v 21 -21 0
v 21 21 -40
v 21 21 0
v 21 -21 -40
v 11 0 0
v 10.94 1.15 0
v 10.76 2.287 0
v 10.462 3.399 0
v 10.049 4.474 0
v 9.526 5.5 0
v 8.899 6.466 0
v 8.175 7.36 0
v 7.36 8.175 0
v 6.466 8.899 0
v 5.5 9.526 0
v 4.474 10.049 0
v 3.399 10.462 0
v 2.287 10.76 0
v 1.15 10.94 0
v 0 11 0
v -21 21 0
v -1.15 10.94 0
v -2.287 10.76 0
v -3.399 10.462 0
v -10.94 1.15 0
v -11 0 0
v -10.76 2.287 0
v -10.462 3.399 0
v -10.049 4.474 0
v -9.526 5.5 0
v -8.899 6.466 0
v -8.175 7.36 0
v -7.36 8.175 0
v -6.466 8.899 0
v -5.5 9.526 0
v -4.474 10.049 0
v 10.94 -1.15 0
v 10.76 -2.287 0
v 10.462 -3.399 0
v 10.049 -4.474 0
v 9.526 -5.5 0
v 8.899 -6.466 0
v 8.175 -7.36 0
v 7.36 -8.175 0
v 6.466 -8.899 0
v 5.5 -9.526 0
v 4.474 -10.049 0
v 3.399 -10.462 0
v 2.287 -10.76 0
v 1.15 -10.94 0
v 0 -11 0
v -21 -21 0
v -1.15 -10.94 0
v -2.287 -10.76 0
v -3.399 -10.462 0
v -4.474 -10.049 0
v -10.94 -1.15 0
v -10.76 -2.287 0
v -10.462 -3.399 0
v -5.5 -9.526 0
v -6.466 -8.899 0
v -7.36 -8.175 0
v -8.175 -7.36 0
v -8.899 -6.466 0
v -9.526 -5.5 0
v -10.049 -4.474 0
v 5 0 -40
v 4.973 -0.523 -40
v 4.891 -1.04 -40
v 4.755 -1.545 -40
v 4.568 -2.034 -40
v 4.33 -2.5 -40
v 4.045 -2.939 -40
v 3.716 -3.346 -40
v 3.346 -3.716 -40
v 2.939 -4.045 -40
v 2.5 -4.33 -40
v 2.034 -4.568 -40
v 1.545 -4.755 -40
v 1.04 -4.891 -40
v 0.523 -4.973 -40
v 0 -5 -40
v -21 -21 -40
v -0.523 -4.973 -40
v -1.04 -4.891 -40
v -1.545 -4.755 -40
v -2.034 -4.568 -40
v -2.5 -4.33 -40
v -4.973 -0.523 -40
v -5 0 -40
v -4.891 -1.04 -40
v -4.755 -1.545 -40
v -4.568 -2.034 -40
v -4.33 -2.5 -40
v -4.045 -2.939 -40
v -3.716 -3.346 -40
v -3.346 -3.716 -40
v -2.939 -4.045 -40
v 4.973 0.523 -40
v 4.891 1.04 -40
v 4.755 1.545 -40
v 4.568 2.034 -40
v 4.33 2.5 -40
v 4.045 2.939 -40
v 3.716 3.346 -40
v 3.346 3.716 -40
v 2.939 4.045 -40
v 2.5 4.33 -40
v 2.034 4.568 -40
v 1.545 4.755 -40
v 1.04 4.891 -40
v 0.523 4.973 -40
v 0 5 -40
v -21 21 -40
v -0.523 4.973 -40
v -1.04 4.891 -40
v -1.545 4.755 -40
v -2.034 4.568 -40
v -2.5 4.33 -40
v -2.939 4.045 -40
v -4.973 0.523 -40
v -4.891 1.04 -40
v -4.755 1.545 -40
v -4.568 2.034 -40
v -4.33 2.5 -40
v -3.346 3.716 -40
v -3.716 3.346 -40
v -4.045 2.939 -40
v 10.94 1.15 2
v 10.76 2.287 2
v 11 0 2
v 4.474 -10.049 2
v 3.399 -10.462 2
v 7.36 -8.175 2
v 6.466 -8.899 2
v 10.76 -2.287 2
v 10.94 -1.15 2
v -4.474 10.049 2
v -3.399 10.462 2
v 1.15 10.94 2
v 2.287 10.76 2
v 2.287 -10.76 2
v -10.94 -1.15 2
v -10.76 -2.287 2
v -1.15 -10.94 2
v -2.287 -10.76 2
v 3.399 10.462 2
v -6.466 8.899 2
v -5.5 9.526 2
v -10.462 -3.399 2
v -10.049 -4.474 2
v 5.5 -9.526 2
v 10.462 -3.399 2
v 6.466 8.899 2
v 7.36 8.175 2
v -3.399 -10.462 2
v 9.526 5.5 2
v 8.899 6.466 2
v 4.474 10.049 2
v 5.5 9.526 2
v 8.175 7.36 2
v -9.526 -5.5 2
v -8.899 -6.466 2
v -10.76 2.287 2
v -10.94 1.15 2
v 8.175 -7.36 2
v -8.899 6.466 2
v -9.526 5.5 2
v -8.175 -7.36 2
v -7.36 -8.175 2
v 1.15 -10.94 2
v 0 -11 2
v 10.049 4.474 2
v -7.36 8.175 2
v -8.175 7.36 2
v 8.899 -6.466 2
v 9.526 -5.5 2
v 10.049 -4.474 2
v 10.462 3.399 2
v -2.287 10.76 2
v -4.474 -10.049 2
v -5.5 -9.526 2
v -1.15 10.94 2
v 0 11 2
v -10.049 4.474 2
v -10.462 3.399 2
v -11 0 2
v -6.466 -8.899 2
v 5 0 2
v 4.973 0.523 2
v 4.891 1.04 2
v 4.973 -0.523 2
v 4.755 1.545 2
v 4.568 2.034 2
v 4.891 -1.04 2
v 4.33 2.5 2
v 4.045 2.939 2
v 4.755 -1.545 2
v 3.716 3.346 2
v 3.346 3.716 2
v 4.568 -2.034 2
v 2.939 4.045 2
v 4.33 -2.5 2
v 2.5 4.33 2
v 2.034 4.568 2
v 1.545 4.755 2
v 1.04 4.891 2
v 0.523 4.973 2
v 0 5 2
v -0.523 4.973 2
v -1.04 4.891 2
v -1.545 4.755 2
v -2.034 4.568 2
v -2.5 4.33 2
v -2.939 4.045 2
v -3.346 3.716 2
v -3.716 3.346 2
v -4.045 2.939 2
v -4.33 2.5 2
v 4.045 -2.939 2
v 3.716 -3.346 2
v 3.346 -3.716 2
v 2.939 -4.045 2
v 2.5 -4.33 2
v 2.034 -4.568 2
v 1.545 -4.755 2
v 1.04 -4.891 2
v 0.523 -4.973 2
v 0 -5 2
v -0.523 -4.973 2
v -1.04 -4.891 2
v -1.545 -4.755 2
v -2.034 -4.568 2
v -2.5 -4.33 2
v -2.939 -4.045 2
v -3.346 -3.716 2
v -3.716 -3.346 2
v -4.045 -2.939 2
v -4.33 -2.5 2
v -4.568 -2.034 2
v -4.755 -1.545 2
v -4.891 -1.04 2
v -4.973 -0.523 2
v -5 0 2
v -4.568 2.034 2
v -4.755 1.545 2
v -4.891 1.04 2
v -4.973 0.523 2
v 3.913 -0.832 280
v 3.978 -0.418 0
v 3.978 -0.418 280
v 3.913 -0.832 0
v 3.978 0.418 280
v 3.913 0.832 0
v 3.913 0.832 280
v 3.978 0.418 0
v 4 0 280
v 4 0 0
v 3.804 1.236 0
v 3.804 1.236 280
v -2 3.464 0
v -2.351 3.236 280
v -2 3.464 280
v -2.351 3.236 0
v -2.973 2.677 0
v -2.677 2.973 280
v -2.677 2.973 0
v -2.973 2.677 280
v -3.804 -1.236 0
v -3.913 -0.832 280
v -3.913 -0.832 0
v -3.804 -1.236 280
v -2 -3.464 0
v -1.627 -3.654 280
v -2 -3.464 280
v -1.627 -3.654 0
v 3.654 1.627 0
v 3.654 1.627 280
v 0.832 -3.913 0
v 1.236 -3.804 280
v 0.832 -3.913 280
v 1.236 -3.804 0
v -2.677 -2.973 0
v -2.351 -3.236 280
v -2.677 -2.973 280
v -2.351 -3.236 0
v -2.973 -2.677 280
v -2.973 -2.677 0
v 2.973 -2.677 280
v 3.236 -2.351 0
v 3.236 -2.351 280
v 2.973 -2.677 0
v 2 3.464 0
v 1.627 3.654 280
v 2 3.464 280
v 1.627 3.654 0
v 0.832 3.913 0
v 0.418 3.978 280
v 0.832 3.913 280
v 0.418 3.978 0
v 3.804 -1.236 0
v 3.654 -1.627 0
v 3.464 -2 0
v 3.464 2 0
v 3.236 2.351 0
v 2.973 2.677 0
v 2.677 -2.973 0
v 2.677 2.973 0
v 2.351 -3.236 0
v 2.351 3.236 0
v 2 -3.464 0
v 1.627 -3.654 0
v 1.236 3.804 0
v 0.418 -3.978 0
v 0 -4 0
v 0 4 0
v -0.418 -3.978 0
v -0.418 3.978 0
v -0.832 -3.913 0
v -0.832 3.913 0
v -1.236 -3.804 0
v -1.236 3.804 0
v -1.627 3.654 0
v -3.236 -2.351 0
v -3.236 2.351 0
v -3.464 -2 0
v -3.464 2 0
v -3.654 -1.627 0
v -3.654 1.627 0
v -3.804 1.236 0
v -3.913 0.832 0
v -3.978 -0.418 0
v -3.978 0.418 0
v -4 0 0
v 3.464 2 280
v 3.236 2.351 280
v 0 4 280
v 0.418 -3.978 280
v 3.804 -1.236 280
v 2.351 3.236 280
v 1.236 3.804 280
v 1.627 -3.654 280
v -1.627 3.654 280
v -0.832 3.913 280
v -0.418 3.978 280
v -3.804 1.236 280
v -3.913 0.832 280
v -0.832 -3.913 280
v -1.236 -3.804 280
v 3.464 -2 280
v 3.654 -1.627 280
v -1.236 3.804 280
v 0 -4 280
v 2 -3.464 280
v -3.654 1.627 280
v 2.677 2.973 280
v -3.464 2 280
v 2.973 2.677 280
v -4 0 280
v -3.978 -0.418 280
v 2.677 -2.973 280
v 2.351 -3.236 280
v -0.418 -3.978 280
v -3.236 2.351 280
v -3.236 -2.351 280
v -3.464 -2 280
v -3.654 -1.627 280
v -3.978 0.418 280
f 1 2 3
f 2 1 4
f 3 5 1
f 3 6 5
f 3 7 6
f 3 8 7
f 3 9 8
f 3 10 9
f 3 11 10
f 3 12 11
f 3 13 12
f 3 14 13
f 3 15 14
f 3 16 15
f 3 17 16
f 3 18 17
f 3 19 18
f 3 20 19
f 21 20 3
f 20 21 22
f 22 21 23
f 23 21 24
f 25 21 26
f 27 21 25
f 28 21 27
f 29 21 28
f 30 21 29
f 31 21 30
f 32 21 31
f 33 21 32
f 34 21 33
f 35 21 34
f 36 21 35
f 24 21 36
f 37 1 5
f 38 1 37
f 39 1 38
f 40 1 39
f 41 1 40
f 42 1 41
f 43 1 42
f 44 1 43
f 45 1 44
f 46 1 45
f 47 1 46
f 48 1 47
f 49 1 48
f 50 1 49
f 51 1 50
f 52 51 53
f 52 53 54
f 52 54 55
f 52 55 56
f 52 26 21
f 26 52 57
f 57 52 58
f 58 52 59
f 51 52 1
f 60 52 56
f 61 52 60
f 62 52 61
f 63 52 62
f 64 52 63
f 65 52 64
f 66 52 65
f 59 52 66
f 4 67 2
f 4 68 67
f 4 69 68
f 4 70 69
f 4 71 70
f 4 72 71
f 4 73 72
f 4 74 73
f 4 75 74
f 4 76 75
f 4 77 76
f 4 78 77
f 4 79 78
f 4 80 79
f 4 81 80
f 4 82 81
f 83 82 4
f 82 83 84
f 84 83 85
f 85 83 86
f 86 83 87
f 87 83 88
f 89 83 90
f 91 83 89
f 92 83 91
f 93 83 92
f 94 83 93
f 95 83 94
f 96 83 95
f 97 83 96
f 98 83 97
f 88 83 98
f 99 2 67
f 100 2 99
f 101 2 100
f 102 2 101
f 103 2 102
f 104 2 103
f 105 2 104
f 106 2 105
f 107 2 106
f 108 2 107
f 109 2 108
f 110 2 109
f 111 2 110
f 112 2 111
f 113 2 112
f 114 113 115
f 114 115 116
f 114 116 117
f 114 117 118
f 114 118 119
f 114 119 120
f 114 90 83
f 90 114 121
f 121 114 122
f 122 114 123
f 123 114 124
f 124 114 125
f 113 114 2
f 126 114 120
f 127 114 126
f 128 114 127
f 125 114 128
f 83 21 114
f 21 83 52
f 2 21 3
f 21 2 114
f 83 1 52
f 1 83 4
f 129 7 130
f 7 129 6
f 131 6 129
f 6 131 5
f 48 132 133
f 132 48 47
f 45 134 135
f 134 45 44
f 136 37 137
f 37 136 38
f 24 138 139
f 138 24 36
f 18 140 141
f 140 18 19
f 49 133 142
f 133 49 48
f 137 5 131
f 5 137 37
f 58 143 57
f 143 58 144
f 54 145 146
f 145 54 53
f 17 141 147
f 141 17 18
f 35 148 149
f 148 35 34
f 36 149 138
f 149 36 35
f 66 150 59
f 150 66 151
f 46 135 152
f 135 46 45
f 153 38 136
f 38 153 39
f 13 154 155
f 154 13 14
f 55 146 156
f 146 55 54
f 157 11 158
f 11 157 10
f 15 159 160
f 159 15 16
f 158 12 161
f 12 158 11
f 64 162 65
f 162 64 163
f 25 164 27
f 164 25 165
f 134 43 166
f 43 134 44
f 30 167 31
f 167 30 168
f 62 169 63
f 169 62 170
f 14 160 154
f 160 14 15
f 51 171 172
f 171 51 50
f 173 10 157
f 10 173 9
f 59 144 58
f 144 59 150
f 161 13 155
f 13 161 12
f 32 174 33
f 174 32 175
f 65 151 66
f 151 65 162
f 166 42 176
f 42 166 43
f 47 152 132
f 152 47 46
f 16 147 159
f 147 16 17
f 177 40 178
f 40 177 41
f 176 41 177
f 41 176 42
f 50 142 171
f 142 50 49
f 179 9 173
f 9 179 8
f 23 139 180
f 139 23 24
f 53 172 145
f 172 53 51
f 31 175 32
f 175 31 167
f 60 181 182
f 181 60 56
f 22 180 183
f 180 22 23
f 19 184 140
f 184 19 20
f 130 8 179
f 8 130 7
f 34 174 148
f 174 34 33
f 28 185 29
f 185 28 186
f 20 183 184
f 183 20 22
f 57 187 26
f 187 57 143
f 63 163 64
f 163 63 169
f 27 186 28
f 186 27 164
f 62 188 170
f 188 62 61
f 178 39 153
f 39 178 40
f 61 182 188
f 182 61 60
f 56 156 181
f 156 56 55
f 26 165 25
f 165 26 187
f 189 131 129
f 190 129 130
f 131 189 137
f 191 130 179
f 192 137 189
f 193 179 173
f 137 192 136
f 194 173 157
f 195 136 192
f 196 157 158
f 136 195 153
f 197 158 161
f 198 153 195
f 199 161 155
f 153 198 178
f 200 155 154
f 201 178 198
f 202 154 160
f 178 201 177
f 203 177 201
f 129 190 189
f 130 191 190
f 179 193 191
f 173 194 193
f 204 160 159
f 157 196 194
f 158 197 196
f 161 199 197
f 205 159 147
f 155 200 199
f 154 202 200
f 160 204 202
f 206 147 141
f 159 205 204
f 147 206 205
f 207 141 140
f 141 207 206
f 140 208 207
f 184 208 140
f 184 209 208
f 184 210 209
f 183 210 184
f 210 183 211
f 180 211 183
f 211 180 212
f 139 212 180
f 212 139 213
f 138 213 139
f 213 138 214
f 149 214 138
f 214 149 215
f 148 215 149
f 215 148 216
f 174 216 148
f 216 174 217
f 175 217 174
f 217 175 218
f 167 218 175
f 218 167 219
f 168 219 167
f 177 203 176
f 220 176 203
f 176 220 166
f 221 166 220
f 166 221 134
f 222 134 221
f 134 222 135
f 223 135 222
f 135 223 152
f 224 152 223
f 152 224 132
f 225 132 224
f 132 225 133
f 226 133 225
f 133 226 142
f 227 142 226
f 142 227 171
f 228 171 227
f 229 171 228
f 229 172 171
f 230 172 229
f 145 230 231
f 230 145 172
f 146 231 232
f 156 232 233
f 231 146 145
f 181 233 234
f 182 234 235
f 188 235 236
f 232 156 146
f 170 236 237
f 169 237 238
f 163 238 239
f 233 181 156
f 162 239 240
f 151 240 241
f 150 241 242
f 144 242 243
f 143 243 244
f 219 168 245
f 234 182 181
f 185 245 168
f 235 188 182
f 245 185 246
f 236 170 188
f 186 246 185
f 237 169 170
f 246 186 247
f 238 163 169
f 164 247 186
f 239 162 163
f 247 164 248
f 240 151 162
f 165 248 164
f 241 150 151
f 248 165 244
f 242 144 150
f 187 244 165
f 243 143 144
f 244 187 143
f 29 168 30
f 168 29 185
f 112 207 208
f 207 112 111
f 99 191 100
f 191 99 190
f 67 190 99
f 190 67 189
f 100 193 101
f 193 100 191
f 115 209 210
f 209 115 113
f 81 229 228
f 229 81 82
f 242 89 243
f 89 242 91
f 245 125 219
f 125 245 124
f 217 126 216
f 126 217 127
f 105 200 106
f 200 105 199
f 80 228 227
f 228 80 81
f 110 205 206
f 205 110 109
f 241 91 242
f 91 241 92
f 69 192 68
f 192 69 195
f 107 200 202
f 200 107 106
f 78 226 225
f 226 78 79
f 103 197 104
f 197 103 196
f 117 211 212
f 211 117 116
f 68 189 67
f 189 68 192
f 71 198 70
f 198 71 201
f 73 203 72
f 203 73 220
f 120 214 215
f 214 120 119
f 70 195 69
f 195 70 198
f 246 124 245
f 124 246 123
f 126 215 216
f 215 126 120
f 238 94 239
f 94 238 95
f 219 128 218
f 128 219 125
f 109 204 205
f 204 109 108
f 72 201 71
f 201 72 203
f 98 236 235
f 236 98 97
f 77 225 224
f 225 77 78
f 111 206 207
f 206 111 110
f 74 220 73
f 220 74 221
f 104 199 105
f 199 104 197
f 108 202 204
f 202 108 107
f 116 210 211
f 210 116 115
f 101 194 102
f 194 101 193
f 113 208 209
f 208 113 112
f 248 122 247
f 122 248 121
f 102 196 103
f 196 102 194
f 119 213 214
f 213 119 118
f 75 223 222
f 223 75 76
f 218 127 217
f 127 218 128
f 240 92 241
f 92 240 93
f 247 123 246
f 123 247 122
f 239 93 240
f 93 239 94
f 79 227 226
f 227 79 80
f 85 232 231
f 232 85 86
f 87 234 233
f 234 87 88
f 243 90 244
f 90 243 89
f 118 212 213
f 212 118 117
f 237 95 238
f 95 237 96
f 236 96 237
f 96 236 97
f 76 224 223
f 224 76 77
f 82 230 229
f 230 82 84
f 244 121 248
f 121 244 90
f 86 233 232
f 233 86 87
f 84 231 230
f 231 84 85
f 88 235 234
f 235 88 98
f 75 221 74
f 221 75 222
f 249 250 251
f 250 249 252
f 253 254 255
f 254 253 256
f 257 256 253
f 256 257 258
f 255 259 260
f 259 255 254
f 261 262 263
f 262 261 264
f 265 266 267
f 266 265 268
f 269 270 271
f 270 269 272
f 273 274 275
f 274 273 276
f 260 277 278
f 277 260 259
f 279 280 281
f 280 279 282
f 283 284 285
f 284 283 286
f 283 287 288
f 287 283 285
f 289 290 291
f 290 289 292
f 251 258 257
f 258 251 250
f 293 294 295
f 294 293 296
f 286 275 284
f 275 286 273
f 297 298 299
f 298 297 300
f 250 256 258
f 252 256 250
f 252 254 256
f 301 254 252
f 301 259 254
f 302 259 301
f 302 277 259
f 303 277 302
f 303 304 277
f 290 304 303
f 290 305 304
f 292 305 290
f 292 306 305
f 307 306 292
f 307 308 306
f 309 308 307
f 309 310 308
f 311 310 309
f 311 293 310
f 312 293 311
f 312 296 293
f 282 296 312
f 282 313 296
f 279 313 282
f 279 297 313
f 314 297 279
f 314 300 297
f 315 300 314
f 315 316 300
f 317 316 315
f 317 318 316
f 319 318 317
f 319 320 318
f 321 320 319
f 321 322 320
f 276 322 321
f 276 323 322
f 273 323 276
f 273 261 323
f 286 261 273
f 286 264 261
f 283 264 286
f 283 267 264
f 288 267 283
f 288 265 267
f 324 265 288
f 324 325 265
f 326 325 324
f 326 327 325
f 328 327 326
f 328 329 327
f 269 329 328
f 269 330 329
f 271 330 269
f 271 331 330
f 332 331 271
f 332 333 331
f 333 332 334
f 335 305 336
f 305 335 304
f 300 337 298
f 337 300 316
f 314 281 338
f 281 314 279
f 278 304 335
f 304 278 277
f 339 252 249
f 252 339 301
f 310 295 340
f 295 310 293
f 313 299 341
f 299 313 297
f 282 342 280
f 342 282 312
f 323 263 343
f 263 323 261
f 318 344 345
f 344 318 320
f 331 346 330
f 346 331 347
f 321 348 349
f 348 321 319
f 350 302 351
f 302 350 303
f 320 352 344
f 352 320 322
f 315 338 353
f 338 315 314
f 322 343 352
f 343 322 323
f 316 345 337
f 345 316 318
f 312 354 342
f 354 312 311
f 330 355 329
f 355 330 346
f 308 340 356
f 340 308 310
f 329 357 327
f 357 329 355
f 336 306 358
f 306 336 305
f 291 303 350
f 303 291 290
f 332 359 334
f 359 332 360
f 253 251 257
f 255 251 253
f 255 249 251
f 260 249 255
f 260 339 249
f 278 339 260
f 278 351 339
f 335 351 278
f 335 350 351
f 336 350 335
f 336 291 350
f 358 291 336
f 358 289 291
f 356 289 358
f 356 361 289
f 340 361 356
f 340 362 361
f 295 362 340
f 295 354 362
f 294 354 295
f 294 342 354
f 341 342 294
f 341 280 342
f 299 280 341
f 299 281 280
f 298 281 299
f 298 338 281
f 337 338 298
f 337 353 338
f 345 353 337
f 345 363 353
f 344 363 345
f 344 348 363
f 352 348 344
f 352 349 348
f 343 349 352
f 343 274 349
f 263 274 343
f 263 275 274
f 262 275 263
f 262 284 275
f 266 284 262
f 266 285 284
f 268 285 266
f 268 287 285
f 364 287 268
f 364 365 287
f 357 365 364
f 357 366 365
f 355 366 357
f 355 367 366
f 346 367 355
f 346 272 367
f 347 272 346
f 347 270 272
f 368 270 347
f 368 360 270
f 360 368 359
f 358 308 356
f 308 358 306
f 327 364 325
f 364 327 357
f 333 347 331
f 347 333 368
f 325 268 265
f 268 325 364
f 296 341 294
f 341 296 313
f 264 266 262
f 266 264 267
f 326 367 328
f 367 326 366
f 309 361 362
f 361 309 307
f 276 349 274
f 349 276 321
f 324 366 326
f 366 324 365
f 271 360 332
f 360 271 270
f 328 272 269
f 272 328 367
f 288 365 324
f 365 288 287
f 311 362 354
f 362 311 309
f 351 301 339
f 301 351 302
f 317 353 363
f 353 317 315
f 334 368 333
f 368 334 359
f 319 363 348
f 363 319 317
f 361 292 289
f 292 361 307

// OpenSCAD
// file: _params.scad
// =========================================================================
// 공유 파라미터 (모든 개별 부품 파일에서 include)
// 메인 어셈블리: cup_z_x_catrage_frame_water_mic_anti_3030.scad 에서 추출
// 프레임: 600 × 420 × 700mm (3030 프로파일, Y=0 대칭)
// =========================================================================

$fn = 60;  // 부품 출력용 고해상도
GLOBAL_TOLERANCE = 0.2;

// --- [1] 하부 기성품 및 원통 파라미터 ---
X_RAIL_LEN = 290.0;
X_BLOCK_W = 30.0; X_BLOCK_L = 32.0;   // 신규 X슬라이더 블록 (폭 30mm × 길이 32mm)
X_PITCH_X = 20.0; X_PITCH_Y = 20.0;   // 체결 홀 피치 (20 × 20mm, M3 나사탭 4개)
X_RAIL_W = 30.0;  X_RAIL_H = 20.0;   // 레일 폭 30mm (레일 바닥~블록 윗면 높이 29mm 반영)
X_TOTAL_H = 29.0;                    // 레일 바닥에서 슬라이더 블록 윗면까지의 높이

MOTOR_W = 42.0;      MOTOR_PITCH = 31.0; MOTOR_HOLE_D = 3.5;    
MOTOR_BOSS_D = 22.0; MOTOR_BOSS_H = 2.0; SCREW_D = 8.0;         
MOT_BODY_L = 41.0;   SHAFT_L = 24.0;     // 실측 NEMA17 몸통 41mm / 축 돌출 24mm

CUP_ID = 99.5;  CUP_WALL = 5.0; CUP_OD = 110.0;     // 아크릴 원통 OD110/ID100
CUP_H = 180.0;   CAGE_H = 60.0;  FLOOR_H = 10.0; PISTON_H = 20.0;     

LIP_D = 30.0;    LIP_H = 5.0;    LEAK_DRAIN_D = 4.0;    
GUIDE_PIPE_D = 8.0; BUSHING_OD = 12.0; BUSHING_H = 8.0;       
DRAIN_RADIUS = 35.0; DRAIN_D = 8.0;        

Y_OFFSET = 85.0; BRKT_H = 12.0; BRKT_D = 122.0; BRKT_ID = 62.0; Z_MOUNT_PCD = 86.0;   

// --- [2] 아크릴 파이프 및 상부 카트리지 ---
ACRYL_ID = 100.0; ACRYL_T = 5.0; ACRYL_OD = ACRYL_ID + (ACRYL_T * 2);  // OD110 (아크릴집 106 재고없음 → 컵과 동일 규격)

REVOLVER_PCD = 240.0;     // 인접 카트리지 웹 9.8mm 확보 (OD110 대응, 230→240)
CARTRIDGE_OD = REVOLVER_PCD + ACRYL_OD + 8; 
TOP_PLATE_H = 15.0;       // 아크릴 15T 통판 (보스홀 단 깊이 10mm)

HUB_D = 60.0;            
SHAFT_D = 12.0;          
HUB_WALL = 4.0;          
HUB_H = 15.0;             // 아크릴 5T × 3장 적층 — 파이프 130mm 대응
POCKET_DEPTH = 5.0;
MID_HUB_Z = 63.5;          // 중단 허브 하면 Z (벨트 중심 Z=71.0mm 정렬, 풀리 상단 Z=75.0mm = 축상단-1mm)
UPPER_HUB_Z = 135.0;       // 상단 허브 하면 Z (전체 135+15=150 유지)
BOSS_OD = 35.0;
BOSS_H = 11.0;             // 보스11 + 와셔1 = 12, 리세스10 → 허브 2mm 공중

// --- [3] GT2 벨트 구동 시스템 ---
GT2_PITCH     = 2.0;
GT2_BELT_W    = 6.0;
BIG_PULLEY_TEETH = 566;
BIG_PULLEY_PD = BIG_PULLEY_TEETH * GT2_PITCH / PI;
BIG_PULLEY_OD = BIG_PULLEY_PD + 1.0;
SMALL_PULLEY_TEETH = 20;
SMALL_PULLEY_PD = SMALL_PULLEY_TEETH * GT2_PITCH / PI;
SMALL_PULLEY_OD = SMALL_PULLEY_PD + 1.0;

BELT_MOTOR_X = -300;
BELT_MOTOR_Y = -155.5;
BRKT_MOTOR_H = 25.0;
BRKT_MOTOR_W = 45.0;        // 브래킷 폭 45mm (프로파일 간섭 회피 복원)
SLOT_LEN = 10.0;
FLAG_W = 15.0;  FLAG_H = 8.0;  FLAG_T = 1.5;

X_POS_MEASURE = 170.0;   // 측정 브래킷 X좌표 (X_M~X_R 정중앙, X대칭)

// --- [4] 3030 프레임 경계 (600×430×700mm) ---
PF = 30;             // 3030 알루미늄 프로파일
WASHER_T = 1.0;     

X_L = -320;
X_M = 60;
X_R = 250;
Y_F = -210;          // 전방 (대칭: -210+30=-180, Y=0 중심)
Y_B = 180;           // 후방 (대칭: 180+30=210, Y=0 중심) — 메인파일과 동기화

Z_BOT = -480;
Z_RAIL = -322;
Z_MID = -TOP_PLATE_H - PF;
Z_TOP = 220;

SUPPORT_PILLAR_H = Z_TOP - PF;

SHAFT_SQ = 20;       // 2020 사각 회전축

// 사각 축 홀 크기
SQ = SHAFT_SQ + GLOBAL_TOLERANCE;  // 20.2mm

// --- 리볼버/컵 축 정렬 (보스홀=판 중심에 리볼버 정렬) ---
REVOLVER_CX = (X_L + X_M + PF)/2;        // 판 중심 = 보스홀 = 리볼버 회전축 (-115)
DROP_X      = REVOLVER_CX + REVOLVER_PCD/2;  // 링 드롭 / 컵 적재 축 (+5)

FLANGE_Z = 52.0;       // 모터 전면 안착 높이 (Z=52mm -> 축 상단 Z=76mm, 풀리 결합)

// --- [5] 모터 체결홀 (이미 제작 완료된 15T 상판 원본 도면 수치 100% 유지) ---
MOTOR_BOLT_PITCH     = 25.0;      // Y피치 (Y = ±12.5mm)
MOTOR_BOLT_X_NOMINAL = X_L + 55;  // 1열: 상판 좌단 55 (모터축 기준 +35mm = X=-265mm)
MOTOR_BOLT_X_SHIFT   = X_L + 40;  // 2열: 상판 좌단 40 (모터축 기준 +20mm = X=-280mm)

// 모터 마운트 볼트 카운터보어 (단볼트용 — 브래킷 두께 25 중 깊게 파냄)
MOTOR_CB_D     = 6.5;            // M3 캡볼트 머리 클리어런스
MOTOR_CB_DEPTH = 19;             // 카운터보어 깊이 (잔여 통과 6mm → M3×10 단볼트)
// main file
// =========================================================================
// [구매] Z축 모터 + 리드스크류 세트 × 1
// 구매: NEMA17 스테핑모터 + T8 리드스크류(~290mm) + 리드넛
// 메인 파일 z_motor_dummy() + z_moving_parts_assembly() 스크류 부분 복사
// =========================================================================
include <_params.scad>

// NEMA17 모터 본체
color([0.1, 0.1, 0.1]) difference() {
    union() {
        translate([-MOTOR_W/2, -MOTOR_W/2, -40]) cube([MOTOR_W, MOTOR_W, 40]);
        cylinder(d=MOTOR_BOSS_D, h=MOTOR_BOSS_H);
    }
    translate([0, 0, -45]) cylinder(d = SCREW_D + 2, h = 50);
}

// 리드스크류 (ø8 × 280mm)
color([0.9, 0.9, 0.2]) cylinder(d=8, h=280);
